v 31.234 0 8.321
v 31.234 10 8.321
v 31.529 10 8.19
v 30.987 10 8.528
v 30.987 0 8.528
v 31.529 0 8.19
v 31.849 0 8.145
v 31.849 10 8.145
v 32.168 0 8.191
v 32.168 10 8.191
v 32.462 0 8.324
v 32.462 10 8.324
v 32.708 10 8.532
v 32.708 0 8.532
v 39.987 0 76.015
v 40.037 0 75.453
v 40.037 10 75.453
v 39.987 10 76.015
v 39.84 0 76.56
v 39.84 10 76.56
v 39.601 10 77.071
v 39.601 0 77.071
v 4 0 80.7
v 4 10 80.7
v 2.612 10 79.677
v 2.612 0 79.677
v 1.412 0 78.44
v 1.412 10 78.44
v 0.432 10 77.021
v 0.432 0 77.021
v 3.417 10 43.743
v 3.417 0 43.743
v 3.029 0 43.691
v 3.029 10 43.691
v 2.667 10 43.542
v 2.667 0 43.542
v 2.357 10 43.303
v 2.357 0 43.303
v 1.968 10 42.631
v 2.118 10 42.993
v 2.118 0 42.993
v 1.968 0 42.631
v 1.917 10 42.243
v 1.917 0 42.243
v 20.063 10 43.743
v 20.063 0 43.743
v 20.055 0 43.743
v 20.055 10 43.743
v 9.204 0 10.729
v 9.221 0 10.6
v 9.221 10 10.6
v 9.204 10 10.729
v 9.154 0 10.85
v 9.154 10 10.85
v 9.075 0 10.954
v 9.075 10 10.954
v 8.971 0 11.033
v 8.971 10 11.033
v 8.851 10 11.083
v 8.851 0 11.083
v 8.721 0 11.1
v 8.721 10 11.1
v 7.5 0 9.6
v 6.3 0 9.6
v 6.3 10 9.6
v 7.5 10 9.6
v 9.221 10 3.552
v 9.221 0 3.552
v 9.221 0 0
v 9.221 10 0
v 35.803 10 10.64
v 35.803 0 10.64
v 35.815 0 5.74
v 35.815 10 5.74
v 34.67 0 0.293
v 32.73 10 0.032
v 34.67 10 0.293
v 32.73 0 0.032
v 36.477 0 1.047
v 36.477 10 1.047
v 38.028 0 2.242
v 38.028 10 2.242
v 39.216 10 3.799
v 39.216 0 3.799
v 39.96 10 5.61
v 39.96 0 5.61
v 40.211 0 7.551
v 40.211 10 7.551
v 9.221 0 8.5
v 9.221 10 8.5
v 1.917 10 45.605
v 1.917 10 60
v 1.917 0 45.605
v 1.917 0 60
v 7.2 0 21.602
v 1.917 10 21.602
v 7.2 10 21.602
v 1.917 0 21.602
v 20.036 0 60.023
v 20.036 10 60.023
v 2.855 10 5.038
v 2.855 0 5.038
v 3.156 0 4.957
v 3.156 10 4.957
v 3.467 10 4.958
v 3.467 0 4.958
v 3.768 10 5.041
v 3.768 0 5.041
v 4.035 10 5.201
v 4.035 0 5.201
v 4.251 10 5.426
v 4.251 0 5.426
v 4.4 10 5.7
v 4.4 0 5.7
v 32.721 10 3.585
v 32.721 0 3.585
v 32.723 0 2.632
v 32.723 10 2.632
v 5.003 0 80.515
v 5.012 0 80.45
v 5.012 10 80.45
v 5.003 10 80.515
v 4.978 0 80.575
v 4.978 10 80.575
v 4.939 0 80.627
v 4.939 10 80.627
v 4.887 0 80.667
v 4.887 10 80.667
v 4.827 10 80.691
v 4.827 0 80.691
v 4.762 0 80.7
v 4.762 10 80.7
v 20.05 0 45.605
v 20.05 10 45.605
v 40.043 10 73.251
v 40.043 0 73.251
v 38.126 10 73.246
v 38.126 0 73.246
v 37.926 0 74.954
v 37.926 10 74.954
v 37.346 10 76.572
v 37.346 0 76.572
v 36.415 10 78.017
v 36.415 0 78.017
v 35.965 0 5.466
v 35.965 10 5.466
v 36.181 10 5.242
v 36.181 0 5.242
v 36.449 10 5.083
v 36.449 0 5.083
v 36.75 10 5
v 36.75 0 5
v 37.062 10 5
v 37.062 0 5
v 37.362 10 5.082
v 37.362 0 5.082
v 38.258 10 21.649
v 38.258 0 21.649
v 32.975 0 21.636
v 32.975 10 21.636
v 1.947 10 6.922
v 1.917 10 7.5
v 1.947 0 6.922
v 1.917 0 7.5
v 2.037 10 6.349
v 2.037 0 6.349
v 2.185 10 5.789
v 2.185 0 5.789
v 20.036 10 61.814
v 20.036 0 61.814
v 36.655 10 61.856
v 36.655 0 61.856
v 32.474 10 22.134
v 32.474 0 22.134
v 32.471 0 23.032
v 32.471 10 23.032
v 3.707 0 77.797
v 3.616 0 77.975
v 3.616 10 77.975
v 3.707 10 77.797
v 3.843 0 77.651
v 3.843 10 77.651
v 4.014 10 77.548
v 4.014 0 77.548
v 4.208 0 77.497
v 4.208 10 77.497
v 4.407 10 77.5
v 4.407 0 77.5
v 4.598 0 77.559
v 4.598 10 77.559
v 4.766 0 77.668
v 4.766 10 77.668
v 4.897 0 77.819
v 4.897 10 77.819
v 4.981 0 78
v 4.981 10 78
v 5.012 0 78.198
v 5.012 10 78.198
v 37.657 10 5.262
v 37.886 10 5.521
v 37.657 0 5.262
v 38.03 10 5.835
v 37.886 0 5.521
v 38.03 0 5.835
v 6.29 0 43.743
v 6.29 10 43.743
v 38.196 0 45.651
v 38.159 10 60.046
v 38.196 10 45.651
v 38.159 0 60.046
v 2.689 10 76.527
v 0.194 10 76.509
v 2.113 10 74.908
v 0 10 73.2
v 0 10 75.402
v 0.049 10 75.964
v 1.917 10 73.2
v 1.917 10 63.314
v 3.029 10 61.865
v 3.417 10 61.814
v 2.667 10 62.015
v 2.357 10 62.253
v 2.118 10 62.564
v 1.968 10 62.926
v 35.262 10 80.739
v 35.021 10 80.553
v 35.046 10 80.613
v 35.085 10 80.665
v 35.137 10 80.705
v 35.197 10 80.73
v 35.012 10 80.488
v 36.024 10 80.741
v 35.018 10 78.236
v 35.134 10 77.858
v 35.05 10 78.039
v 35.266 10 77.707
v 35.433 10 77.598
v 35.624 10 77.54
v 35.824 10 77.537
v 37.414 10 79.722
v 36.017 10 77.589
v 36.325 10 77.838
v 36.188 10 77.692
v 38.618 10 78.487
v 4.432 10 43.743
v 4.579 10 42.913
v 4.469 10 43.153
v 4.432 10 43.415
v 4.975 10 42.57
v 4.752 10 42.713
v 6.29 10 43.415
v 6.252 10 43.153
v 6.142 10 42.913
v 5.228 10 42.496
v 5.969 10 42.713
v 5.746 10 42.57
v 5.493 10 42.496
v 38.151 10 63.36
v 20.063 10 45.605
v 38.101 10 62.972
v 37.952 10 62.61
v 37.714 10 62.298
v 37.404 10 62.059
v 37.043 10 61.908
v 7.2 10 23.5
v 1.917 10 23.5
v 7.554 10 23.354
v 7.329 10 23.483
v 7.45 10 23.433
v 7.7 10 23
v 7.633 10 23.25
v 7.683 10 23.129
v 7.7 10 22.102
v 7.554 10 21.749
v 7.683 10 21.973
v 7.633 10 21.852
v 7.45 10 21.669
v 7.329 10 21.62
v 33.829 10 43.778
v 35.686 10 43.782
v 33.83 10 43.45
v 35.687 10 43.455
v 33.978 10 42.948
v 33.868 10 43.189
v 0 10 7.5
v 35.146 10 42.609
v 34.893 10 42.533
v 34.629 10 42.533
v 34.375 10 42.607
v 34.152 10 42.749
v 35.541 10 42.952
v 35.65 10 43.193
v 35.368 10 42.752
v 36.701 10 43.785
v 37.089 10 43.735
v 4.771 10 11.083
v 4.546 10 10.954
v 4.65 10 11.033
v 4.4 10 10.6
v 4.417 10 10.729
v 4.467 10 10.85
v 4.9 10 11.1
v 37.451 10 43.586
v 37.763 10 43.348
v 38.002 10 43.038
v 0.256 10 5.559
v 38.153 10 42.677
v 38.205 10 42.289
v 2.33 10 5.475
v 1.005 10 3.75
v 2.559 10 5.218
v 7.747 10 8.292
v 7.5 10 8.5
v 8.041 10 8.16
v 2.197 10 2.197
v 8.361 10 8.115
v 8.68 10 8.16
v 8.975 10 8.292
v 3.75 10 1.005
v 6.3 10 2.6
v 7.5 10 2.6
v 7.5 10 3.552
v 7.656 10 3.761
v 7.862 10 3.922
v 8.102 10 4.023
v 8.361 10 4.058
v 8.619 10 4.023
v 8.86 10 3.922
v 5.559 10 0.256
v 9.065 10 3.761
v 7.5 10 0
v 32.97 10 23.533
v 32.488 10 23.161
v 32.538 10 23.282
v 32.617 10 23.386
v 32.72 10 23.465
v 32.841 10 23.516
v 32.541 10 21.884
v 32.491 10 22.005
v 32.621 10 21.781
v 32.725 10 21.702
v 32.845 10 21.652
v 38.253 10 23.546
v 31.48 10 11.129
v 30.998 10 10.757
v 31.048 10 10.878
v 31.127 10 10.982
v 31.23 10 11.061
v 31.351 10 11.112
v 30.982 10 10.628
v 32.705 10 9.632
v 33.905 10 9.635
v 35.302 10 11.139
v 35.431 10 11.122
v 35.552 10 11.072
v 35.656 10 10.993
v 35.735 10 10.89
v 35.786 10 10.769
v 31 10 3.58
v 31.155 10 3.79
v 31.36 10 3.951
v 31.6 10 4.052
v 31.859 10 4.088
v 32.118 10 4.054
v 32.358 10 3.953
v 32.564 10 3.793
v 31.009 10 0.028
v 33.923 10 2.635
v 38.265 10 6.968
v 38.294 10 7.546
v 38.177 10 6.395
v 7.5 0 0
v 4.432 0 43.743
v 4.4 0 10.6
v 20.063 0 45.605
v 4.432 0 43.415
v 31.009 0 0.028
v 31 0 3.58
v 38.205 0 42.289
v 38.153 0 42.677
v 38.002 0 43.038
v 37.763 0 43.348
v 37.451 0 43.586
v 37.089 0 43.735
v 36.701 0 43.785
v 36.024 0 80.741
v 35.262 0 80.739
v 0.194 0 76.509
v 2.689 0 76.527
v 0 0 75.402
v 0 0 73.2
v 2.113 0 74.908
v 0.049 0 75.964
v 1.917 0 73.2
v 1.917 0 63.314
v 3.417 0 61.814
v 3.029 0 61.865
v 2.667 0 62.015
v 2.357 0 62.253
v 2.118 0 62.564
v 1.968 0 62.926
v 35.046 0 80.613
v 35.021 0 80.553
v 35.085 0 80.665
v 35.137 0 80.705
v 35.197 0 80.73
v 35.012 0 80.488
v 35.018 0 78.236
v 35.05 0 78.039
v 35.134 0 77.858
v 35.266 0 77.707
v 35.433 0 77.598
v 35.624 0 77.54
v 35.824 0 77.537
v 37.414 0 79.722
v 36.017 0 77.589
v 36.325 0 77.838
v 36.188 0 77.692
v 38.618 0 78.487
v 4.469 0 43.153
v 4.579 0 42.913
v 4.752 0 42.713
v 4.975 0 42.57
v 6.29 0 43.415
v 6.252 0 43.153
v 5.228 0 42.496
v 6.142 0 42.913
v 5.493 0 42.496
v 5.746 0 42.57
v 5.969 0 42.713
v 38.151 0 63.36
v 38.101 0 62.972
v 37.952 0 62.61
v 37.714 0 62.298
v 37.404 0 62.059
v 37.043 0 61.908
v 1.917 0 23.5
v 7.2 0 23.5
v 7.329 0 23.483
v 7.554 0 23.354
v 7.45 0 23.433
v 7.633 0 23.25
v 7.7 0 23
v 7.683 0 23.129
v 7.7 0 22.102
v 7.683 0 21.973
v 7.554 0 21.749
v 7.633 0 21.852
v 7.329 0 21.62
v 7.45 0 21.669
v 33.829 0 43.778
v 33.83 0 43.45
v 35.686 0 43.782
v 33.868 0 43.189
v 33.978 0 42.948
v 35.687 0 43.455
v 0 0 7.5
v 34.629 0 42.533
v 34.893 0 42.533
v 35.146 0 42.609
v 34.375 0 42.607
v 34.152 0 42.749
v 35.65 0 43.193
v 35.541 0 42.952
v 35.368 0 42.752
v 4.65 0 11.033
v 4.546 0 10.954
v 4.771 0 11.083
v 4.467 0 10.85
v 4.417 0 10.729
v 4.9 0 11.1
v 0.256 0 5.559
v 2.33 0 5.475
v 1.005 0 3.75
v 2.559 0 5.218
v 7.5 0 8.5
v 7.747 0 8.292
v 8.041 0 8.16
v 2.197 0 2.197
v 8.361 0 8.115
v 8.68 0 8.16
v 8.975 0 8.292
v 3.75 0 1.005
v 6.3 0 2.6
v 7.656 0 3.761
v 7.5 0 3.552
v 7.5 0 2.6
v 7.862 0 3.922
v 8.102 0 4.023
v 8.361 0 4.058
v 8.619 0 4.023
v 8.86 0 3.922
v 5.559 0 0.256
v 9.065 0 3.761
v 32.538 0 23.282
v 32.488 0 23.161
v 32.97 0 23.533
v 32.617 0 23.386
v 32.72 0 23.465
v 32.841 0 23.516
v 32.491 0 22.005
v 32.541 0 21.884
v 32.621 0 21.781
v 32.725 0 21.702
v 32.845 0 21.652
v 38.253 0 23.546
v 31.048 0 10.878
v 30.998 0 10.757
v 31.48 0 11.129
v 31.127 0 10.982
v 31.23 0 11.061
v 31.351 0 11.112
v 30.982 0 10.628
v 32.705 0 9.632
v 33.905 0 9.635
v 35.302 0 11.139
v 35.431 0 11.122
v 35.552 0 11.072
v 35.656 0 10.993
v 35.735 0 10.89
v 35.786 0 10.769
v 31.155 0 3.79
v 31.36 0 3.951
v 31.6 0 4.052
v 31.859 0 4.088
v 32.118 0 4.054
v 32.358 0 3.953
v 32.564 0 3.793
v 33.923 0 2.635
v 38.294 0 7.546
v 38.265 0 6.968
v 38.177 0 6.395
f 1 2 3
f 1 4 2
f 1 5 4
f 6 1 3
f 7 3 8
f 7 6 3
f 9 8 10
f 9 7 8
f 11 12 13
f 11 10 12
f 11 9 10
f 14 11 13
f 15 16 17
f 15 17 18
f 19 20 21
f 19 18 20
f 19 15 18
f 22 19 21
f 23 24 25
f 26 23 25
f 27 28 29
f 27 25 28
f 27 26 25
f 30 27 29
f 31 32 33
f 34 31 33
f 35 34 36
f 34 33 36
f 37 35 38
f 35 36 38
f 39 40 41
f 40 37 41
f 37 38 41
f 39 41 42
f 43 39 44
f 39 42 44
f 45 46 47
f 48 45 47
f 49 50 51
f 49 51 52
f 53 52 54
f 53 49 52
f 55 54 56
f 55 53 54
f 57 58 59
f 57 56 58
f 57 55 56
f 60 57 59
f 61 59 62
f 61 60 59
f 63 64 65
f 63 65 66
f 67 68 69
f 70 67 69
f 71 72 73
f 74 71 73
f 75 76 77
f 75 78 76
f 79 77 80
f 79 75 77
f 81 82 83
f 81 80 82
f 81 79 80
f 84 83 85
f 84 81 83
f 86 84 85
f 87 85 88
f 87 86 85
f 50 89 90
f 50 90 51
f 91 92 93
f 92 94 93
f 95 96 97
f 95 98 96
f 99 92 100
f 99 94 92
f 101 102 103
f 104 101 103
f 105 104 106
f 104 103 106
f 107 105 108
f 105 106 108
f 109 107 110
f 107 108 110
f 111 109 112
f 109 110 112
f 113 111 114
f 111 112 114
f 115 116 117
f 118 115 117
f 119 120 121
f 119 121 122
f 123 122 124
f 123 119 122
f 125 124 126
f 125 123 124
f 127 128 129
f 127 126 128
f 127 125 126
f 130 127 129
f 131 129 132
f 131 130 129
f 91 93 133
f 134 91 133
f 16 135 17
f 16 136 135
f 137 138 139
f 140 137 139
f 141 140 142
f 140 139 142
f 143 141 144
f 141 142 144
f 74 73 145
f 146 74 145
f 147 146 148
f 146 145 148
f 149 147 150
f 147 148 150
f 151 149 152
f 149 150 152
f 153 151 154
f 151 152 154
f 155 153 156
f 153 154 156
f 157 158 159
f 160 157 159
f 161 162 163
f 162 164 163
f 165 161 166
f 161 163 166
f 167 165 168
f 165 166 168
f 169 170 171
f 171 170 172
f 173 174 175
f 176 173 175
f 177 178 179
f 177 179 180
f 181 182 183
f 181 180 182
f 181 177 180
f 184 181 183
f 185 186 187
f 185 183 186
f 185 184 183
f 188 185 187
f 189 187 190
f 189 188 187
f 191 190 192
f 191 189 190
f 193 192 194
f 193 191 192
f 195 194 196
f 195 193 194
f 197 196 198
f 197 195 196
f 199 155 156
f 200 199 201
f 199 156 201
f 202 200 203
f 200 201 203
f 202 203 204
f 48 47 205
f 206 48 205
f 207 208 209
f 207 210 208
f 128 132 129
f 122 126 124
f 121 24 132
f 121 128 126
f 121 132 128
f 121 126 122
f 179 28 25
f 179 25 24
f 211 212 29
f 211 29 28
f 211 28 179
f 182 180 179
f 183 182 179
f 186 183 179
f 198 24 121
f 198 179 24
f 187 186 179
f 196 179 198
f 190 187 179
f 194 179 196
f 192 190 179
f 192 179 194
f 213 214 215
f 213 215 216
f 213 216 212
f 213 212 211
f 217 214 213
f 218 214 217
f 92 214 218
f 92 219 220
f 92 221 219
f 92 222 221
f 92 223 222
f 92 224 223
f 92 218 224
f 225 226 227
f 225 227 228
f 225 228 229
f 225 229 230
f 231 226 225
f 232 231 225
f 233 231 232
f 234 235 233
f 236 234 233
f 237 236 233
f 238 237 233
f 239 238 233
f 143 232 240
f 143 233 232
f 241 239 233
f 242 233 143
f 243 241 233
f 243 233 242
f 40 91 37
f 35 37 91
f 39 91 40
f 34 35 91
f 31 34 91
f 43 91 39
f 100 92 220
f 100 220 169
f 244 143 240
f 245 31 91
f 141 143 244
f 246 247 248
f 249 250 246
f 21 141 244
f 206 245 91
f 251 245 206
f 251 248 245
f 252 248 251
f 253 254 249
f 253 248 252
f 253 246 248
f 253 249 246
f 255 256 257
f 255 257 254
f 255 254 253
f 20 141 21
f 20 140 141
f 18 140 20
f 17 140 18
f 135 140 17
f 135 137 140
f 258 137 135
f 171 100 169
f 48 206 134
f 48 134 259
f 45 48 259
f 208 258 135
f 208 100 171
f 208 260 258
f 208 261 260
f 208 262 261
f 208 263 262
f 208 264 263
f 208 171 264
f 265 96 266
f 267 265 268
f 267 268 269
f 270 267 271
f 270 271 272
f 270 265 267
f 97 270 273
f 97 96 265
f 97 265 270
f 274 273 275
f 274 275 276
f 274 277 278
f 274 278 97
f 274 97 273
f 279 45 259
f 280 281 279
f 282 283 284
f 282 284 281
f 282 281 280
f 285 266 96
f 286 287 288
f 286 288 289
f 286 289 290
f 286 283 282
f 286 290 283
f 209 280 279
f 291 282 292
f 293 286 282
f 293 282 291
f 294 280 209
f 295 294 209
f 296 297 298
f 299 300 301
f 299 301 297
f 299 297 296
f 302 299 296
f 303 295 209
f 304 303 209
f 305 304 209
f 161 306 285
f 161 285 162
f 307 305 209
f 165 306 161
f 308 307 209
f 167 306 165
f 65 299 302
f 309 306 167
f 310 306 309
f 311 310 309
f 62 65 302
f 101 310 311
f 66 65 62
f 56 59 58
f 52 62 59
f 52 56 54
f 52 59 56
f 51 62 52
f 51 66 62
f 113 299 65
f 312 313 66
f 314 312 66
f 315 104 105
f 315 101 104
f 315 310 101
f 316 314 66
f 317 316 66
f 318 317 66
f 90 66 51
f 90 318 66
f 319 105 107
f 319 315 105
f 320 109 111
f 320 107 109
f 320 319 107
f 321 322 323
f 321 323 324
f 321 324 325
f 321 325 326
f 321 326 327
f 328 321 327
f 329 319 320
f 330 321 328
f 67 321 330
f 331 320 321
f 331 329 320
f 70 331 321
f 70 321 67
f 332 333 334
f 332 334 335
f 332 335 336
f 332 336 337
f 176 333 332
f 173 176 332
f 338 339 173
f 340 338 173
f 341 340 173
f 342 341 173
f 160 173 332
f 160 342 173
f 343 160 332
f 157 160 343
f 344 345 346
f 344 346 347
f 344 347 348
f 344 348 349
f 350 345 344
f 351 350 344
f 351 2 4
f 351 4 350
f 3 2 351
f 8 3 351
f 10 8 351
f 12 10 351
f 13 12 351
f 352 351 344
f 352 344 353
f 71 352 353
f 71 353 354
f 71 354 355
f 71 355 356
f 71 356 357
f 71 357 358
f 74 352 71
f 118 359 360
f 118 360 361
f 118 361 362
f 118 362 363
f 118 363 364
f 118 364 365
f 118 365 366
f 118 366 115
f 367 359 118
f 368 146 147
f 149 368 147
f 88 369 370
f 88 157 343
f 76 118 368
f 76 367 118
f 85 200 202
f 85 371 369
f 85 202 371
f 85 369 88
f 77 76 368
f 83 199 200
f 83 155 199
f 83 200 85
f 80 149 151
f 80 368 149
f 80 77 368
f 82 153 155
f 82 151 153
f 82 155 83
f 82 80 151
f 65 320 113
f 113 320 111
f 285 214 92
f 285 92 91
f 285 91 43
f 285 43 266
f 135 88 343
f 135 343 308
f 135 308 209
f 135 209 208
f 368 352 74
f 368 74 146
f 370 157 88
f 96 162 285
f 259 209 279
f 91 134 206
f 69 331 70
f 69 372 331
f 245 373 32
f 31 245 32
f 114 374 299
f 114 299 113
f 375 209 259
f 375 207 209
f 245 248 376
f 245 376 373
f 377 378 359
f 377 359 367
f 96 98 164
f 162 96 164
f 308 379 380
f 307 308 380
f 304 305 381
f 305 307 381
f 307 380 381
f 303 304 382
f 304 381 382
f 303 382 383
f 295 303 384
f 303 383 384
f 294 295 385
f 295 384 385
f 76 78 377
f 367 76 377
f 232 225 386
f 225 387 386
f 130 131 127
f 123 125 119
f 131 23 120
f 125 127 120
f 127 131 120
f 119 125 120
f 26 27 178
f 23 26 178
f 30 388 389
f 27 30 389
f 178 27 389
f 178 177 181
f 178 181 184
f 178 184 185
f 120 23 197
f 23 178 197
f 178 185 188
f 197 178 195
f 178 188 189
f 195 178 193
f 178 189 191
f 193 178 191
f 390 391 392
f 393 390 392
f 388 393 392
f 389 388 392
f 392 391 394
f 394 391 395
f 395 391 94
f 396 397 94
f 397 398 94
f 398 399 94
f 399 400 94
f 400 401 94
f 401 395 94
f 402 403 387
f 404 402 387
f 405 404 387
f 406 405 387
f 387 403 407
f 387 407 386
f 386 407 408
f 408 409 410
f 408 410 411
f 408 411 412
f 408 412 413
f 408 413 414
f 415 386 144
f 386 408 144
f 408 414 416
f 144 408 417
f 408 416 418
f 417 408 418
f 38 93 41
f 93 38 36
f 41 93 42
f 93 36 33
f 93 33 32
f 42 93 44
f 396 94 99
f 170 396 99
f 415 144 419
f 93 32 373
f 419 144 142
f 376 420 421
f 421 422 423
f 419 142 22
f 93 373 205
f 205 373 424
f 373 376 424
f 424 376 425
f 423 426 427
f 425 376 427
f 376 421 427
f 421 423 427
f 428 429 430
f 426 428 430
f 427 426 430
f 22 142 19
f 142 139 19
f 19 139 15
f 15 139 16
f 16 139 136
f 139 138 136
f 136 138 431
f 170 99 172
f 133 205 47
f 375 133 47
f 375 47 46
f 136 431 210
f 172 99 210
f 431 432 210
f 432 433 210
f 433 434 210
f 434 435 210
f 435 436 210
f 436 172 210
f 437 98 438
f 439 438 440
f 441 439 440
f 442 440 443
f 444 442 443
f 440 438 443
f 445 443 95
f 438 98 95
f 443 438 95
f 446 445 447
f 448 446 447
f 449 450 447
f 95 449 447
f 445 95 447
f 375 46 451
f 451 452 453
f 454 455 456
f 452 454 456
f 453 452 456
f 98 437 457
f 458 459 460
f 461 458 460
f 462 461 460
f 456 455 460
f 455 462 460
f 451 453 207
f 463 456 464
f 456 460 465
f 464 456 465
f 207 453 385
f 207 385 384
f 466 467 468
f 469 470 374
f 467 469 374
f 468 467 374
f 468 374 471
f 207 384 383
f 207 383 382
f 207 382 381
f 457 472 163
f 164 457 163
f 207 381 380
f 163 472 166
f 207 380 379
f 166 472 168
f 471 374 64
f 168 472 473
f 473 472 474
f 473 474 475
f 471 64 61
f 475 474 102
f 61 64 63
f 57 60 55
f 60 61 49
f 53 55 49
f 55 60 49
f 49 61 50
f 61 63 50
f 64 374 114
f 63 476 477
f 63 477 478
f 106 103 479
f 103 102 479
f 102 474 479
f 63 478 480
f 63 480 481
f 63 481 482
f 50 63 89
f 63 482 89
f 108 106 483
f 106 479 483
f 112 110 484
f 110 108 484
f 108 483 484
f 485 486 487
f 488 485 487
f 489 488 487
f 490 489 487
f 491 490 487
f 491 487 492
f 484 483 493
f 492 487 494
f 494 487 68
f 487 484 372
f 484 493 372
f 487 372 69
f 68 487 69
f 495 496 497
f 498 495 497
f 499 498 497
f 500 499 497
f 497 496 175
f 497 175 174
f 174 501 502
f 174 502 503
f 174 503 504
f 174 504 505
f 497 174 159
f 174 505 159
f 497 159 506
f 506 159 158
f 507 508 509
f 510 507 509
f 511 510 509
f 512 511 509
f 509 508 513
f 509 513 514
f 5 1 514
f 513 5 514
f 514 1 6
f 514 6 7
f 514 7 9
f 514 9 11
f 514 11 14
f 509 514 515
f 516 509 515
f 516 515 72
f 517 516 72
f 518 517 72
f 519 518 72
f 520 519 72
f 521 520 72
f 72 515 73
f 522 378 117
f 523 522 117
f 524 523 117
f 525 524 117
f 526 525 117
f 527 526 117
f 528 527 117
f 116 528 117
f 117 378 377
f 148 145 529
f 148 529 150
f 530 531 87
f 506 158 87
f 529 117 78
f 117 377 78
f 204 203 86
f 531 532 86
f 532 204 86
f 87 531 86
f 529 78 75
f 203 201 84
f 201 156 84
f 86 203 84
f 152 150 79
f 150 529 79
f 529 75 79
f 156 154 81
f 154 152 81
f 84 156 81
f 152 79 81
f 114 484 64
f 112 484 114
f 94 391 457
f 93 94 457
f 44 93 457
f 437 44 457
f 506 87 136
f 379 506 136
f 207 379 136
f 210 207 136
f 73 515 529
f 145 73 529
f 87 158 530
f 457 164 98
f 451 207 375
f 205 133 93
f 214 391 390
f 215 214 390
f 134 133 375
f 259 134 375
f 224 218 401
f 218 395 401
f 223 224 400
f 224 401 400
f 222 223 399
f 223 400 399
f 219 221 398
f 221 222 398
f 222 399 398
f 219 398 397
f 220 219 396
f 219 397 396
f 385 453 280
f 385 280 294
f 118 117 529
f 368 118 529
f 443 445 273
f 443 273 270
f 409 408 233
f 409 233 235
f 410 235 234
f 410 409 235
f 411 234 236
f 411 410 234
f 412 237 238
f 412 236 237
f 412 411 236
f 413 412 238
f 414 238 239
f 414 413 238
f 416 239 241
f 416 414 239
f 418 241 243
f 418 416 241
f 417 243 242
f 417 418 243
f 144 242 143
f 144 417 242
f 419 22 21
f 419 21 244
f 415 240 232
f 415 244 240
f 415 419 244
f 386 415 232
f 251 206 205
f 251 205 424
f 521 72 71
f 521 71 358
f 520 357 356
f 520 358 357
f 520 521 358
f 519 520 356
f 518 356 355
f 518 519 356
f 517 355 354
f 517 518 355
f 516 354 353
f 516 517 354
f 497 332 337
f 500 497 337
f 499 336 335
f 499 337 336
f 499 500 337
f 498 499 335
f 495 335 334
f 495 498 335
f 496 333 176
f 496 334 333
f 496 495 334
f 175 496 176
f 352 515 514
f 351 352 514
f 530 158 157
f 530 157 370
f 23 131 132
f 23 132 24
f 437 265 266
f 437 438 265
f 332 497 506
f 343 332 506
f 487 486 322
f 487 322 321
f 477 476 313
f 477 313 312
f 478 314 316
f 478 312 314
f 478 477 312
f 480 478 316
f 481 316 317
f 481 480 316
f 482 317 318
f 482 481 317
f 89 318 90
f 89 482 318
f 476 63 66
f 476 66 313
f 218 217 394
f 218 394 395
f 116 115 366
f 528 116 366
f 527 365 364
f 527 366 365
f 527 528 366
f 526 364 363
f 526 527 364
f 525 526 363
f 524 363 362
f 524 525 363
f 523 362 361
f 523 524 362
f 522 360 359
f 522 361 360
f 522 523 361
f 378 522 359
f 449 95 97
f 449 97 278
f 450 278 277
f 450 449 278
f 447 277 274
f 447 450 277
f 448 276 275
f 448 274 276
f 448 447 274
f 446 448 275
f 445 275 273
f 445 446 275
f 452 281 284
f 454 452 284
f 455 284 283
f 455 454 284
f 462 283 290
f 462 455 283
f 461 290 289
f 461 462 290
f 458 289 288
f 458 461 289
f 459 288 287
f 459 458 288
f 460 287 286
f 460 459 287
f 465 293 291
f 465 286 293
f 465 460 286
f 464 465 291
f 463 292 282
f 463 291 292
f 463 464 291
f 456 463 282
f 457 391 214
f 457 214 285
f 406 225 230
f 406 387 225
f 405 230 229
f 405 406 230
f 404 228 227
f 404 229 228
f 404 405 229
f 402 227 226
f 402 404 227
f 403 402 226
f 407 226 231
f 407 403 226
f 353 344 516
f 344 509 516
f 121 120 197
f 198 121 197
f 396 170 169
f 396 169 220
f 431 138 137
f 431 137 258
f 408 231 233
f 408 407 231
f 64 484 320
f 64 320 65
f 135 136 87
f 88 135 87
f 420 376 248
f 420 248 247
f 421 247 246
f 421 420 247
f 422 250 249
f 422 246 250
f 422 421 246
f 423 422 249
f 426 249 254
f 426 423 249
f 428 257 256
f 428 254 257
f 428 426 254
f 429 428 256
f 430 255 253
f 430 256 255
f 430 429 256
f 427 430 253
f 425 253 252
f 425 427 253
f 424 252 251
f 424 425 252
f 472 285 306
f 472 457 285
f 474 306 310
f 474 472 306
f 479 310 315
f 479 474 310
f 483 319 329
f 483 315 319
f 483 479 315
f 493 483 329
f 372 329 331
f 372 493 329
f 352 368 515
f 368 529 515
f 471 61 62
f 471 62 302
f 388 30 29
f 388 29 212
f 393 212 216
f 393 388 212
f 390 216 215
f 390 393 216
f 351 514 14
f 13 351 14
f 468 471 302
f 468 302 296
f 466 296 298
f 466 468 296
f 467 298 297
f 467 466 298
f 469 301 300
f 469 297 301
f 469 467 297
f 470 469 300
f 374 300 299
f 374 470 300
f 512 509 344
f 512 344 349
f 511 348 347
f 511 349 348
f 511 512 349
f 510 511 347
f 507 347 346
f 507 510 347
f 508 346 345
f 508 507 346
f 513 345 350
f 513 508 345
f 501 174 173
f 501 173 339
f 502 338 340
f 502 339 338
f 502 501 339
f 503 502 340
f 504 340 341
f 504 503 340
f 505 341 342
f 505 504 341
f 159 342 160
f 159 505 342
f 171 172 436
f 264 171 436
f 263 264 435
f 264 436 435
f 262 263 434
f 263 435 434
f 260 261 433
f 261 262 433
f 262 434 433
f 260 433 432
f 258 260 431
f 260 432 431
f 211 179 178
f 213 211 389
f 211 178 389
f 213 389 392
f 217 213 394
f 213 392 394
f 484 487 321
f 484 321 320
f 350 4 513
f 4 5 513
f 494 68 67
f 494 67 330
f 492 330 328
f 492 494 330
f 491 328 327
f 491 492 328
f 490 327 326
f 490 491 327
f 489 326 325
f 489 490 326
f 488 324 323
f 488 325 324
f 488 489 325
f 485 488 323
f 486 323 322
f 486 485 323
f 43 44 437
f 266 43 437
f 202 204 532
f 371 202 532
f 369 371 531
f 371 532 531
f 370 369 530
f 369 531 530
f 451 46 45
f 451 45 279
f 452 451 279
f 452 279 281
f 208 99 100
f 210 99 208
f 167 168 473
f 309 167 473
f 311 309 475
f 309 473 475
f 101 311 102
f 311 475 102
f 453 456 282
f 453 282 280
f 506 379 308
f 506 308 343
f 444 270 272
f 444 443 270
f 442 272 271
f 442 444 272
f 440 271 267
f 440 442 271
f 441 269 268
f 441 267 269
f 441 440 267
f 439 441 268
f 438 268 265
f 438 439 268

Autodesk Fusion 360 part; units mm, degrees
sketch "Boceto2" plane through (0, 0, 0) normal (0, 1, 0) x (1, 0, 0)
  line L0 (7.5, 0) -> (9.2213, 0)
  line L1 (0, -73.2) -> (0, -7.5)
  arc A0 (7.5, 0) -> (0, -7.5) centre (7.5, -7.5) ccw
  line L2 (7.5, -3.5523) -> (7.5, -2.6)
  line L3 (7.5, -2.6) -> (6.3, -2.6)
  line L4 (6.3, -2.6) -> (6.3, -9.6)
  line L5 (6.3, -9.6) -> (7.5, -9.6)
  line L6 (7.5, -9.6) -> (7.5, -8.5)
  line L7 (9.2213, -8.5) -> (9.2213, -10.6)
  line L8 (8.7213, -11.1) -> (4.9, -11.1)
  line L9 (4.4, -10.6) -> (4.4, -5.7)
  arc A1 (4.4, -5.7) -> (2.8546, -5.0381) centre (3.3076, -6.1153) ccw
  arc A2 (4.4, -5.7) -> (2.1854, -5.7893) centre (3.3076, -6.1153) ccw
  arc A3 (2.1854, -5.7893) -> (1.9172, -7.5) centre (7.5062, -7.5) ccw
  arc A4 (9.2213, -8.5) -> (7.5, -8.5) centre (8.3607, -9.2707) ccw
  arc A5 (7.5, -3.5523) -> (9.2213, -3.5523) centre (8.3607, -3.072) ccw
  line L10 (9.2213, -3.5523) -> (9.2213, 0)
  line L11 (20.1126, -1.9172) -> (20.115, -1.9172)
  line L12 (1.9172, -21.6025) -> (7.2, -21.6025)
  line L13 (7.7, -22.1025) -> (7.7, -23)
  line L14 (7.2, -23.5) -> (1.9172, -23.5)
  line L15 (1.9172, -45.6046) -> (20.0634, -45.6046)
  line L16 (20.0634, -43.7426) -> (20.0634, -43.7426)
  line L17 (20.036, -60.0002) -> (20.036, -60.0234)
  line L18 (20.036, -61.8138) -> (3.4172, -61.8138)
  line L19 (1.9172, -21.6025) -> (1.9172, -7.5)
  arc A6 (7.2, -23.5) -> (7.7, -23) centre (7.2, -23) ccw
  arc A7 (7.7, -22.1025) -> (7.2, -21.6025) centre (7.2, -22.1025) ccw
  line L20 (1.9172, -42.2426) -> (1.9172, -23.5)
  arc A8 (1.9172, -42.2426) -> (3.4172, -43.7426) centre (3.4172, -42.2426) ccw
  line L21 (6.2895, -43.7426) -> (6.2895, -43.415)
  line L22 (4.4317, -43.415) -> (4.4317, -43.7426)
  arc A9 (6.2895, -43.415) -> (4.4317, -43.415) centre (5.3606, -43.415) ccw
  line L23 (20.0634, -43.7426) -> (6.2895, -43.7426)
  line L24 (4.4317, -43.7426) -> (3.4172, -43.7426)
  line L25 (1.9172, -73.2) -> (1.9172, -63.3138)
  line L26 (1.9172, -60.0002) -> (1.9172, -45.6046)
  arc A10 (3.4172, -61.8138) -> (1.9172, -63.3138) centre (3.4172, -63.3138) ccw
  arc A11 (4.4, -10.6) -> (4.9, -11.1) centre (4.9, -10.6) ccw
  arc A12 (8.7213, -11.1) -> (9.2213, -10.6) centre (8.7213, -10.6) ccw
  line L27 (32.4735, -22.1342) -> (32.4712, -23.0317)
  line L28 (35.8029, -10.6401) -> (35.8154, -5.7401)
  arc A13 (36.701, -43.7851) -> (38.2048, -42.289) centre (36.7048, -42.2851) ccw
  line L29 (38.1594, -60.0465) -> (38.1962, -45.651)
  line L30 (33.8286, -43.7778) -> (33.8295, -43.4502)
  arc A14 (35.6873, -43.4549) -> (33.8295, -43.4502) centre (34.7584, -43.4526) ccw
  line L31 (32.7209, -3.5846) -> (32.7233, -2.6322)
  line L32 (35.6864, -43.7825) -> (36.701, -43.7851)
  line L33 (32.9699, -23.5329) -> (38.2527, -23.5464)
  line L34 (40.0429, -73.2512) -> (40.2108, -7.5514)
  line L35 (38.2048, -42.289) -> (38.2527, -23.5464)
  arc A15 (32.4712, -23.0317) -> (32.9699, -23.5329) centre (32.9712, -23.0329) ccw
  line L36 (35.6873, -43.4549) -> (35.6864, -43.7825)
  arc A16 (37.3625, -5.0822) -> (35.8154, -5.7401) centre (36.9067, -6.1583) ccw
  line L37 (30.9869, -8.5278) -> (30.9816, -10.6278)
  arc A17 (38.2936, -7.5465) -> (38.0298, -5.8351) centre (32.7046, -7.5322) ccw
  line L38 (32.73, -0.0322) -> (31.0086, -0.0278)
  arc A18 (40.2108, -7.5514) -> (32.73, -0.0322) centre (32.7108, -7.5322) ccw
  arc A19 (35.3016, -11.1388) -> (35.8029, -10.6401) centre (35.3029, -10.6388) ccw
  arc A20 (32.9748, -21.6355) -> (32.4735, -22.1342) centre (32.9735, -22.1355) ccw
  line L39 (32.7054, -9.6322) -> (32.7082, -8.5322)
  arc A21 (30.9816, -10.6278) -> (31.4803, -11.1291) centre (31.4816, -10.6291) ccw
  line L40 (33.9233, -2.6353) -> (33.9054, -9.6353)
  arc A22 (38.0298, -5.8351) -> (35.8154, -5.7401) centre (36.9067, -6.1583) ccw
  arc A23 (38.151, -63.3601) -> (36.6548, -61.8563) centre (36.651, -63.3563) ccw
  arc A24 (30.9996, -3.5802) -> (32.7209, -3.5846) centre (31.8615, -3.102) ccw
  line L41 (30.9996, -3.5802) -> (31.0086, -0.0278)
  line L42 (38.1257, -73.2463) -> (38.151, -63.3601)
  line L43 (38.2576, -21.649) -> (38.2936, -7.5465)
  line L44 (31.4803, -11.1291) -> (35.3016, -11.1388)
  line L45 (32.7233, -2.6322) -> (33.9233, -2.6353)
  line L46 (33.9054, -9.6353) -> (32.7054, -9.6322)
  arc A25 (32.7082, -8.5322) -> (30.9869, -8.5278) centre (31.8456, -9.3007) ccw
  line L47 (38.2576, -21.649) -> (32.9748, -21.6355)
  line L48 (20.0548, -43.7426) -> (33.8286, -43.7778)
  line L49 (38.1962, -45.651) -> (20.05, -45.6046)
  line L50 (20.036, -61.8138) -> (36.6548, -61.8563)
  line L51 (1.9172, -60.0002) -> (38.1594, -60.0465)
  line L52 (20.036, -61.8138) -> (20.0119, -80.7) construction
  line L53 (20.115, 0) -> (20.0591, -43.7426) construction
  line L54 (20.0567, -45.6046) -> (20.0383, -60.0234) construction
  line L55 (20.0119, -80.7) -> (5.0119, -80.7) construction
  line L56 (5.0119, -80.45) -> (5.0119, -78.1977)
  arc A26 (5.0119, -78.1977) -> (3.6157, -77.9747) centre (4.2942, -78.2091) ccw
  arc A27 (1.9172, -73.2) -> (3.6157, -77.9747) centre (9.4774, -73.2) ccw
  line L57 (4.7619, -80.7) -> (4, -80.7)
  line L58 (0, -73.2) -> (0, -75.4021)
  arc A28 (0.432, -77.0212) -> (4, -80.7) centre (9.4618, -71.8331) ccw
  arc A29 (4.7619, -80.7) -> (5.0119, -80.45) centre (4.7619, -80.45) ccw
  arc A30 (0, -75.4021) -> (0.432, -77.0212) centre (3.25, -75.4021) ccw
  arc A31 (36.415, -78.0166) -> (38.1257, -73.2463) centre (30.5655, -73.2269) ccw
  line L59 (40.0429, -73.2512) -> (40.0372, -75.4532)
  arc A32 (39.6011, -77.0712) -> (40.0372, -75.4532) centre (36.7873, -75.4449) ccw
  arc A33 (36.415, -78.0166) -> (35.0182, -78.2361) centre (35.7359, -78.2493) ccw
  line L60 (35.0125, -80.4883) -> (35.0182, -78.2361)
  arc A34 (35.0125, -80.4883) -> (35.2618, -80.739) centre (35.2625, -80.489) ccw
  arc A35 (36.0237, -80.7409) -> (39.6011, -77.0712) centre (30.5846, -71.8601) ccw
  line L61 (35.2618, -80.739) -> (36.0237, -80.7409)
  point P0 (0, -80.7)
  point P1 (40.2299, -0.0514)
  point P2 (40.2299, -0.0514)
  point P3 (35.0118, -80.7383)
  dimension "d10" = 80.7
  dimension "d14" = 0.5
  dimension "d15" = 1.5
  dimension "d16" = 1.5
  dimension "d17" = 0.5
  dimension "d19" = 15
  dimension "d20" = 0.25
  dimension "d21" = 3.25
extrude "Extruir1" add sketch "Boceto2" along normal blind 10
equation "L = 10 mm"
equation "d23 = L"
